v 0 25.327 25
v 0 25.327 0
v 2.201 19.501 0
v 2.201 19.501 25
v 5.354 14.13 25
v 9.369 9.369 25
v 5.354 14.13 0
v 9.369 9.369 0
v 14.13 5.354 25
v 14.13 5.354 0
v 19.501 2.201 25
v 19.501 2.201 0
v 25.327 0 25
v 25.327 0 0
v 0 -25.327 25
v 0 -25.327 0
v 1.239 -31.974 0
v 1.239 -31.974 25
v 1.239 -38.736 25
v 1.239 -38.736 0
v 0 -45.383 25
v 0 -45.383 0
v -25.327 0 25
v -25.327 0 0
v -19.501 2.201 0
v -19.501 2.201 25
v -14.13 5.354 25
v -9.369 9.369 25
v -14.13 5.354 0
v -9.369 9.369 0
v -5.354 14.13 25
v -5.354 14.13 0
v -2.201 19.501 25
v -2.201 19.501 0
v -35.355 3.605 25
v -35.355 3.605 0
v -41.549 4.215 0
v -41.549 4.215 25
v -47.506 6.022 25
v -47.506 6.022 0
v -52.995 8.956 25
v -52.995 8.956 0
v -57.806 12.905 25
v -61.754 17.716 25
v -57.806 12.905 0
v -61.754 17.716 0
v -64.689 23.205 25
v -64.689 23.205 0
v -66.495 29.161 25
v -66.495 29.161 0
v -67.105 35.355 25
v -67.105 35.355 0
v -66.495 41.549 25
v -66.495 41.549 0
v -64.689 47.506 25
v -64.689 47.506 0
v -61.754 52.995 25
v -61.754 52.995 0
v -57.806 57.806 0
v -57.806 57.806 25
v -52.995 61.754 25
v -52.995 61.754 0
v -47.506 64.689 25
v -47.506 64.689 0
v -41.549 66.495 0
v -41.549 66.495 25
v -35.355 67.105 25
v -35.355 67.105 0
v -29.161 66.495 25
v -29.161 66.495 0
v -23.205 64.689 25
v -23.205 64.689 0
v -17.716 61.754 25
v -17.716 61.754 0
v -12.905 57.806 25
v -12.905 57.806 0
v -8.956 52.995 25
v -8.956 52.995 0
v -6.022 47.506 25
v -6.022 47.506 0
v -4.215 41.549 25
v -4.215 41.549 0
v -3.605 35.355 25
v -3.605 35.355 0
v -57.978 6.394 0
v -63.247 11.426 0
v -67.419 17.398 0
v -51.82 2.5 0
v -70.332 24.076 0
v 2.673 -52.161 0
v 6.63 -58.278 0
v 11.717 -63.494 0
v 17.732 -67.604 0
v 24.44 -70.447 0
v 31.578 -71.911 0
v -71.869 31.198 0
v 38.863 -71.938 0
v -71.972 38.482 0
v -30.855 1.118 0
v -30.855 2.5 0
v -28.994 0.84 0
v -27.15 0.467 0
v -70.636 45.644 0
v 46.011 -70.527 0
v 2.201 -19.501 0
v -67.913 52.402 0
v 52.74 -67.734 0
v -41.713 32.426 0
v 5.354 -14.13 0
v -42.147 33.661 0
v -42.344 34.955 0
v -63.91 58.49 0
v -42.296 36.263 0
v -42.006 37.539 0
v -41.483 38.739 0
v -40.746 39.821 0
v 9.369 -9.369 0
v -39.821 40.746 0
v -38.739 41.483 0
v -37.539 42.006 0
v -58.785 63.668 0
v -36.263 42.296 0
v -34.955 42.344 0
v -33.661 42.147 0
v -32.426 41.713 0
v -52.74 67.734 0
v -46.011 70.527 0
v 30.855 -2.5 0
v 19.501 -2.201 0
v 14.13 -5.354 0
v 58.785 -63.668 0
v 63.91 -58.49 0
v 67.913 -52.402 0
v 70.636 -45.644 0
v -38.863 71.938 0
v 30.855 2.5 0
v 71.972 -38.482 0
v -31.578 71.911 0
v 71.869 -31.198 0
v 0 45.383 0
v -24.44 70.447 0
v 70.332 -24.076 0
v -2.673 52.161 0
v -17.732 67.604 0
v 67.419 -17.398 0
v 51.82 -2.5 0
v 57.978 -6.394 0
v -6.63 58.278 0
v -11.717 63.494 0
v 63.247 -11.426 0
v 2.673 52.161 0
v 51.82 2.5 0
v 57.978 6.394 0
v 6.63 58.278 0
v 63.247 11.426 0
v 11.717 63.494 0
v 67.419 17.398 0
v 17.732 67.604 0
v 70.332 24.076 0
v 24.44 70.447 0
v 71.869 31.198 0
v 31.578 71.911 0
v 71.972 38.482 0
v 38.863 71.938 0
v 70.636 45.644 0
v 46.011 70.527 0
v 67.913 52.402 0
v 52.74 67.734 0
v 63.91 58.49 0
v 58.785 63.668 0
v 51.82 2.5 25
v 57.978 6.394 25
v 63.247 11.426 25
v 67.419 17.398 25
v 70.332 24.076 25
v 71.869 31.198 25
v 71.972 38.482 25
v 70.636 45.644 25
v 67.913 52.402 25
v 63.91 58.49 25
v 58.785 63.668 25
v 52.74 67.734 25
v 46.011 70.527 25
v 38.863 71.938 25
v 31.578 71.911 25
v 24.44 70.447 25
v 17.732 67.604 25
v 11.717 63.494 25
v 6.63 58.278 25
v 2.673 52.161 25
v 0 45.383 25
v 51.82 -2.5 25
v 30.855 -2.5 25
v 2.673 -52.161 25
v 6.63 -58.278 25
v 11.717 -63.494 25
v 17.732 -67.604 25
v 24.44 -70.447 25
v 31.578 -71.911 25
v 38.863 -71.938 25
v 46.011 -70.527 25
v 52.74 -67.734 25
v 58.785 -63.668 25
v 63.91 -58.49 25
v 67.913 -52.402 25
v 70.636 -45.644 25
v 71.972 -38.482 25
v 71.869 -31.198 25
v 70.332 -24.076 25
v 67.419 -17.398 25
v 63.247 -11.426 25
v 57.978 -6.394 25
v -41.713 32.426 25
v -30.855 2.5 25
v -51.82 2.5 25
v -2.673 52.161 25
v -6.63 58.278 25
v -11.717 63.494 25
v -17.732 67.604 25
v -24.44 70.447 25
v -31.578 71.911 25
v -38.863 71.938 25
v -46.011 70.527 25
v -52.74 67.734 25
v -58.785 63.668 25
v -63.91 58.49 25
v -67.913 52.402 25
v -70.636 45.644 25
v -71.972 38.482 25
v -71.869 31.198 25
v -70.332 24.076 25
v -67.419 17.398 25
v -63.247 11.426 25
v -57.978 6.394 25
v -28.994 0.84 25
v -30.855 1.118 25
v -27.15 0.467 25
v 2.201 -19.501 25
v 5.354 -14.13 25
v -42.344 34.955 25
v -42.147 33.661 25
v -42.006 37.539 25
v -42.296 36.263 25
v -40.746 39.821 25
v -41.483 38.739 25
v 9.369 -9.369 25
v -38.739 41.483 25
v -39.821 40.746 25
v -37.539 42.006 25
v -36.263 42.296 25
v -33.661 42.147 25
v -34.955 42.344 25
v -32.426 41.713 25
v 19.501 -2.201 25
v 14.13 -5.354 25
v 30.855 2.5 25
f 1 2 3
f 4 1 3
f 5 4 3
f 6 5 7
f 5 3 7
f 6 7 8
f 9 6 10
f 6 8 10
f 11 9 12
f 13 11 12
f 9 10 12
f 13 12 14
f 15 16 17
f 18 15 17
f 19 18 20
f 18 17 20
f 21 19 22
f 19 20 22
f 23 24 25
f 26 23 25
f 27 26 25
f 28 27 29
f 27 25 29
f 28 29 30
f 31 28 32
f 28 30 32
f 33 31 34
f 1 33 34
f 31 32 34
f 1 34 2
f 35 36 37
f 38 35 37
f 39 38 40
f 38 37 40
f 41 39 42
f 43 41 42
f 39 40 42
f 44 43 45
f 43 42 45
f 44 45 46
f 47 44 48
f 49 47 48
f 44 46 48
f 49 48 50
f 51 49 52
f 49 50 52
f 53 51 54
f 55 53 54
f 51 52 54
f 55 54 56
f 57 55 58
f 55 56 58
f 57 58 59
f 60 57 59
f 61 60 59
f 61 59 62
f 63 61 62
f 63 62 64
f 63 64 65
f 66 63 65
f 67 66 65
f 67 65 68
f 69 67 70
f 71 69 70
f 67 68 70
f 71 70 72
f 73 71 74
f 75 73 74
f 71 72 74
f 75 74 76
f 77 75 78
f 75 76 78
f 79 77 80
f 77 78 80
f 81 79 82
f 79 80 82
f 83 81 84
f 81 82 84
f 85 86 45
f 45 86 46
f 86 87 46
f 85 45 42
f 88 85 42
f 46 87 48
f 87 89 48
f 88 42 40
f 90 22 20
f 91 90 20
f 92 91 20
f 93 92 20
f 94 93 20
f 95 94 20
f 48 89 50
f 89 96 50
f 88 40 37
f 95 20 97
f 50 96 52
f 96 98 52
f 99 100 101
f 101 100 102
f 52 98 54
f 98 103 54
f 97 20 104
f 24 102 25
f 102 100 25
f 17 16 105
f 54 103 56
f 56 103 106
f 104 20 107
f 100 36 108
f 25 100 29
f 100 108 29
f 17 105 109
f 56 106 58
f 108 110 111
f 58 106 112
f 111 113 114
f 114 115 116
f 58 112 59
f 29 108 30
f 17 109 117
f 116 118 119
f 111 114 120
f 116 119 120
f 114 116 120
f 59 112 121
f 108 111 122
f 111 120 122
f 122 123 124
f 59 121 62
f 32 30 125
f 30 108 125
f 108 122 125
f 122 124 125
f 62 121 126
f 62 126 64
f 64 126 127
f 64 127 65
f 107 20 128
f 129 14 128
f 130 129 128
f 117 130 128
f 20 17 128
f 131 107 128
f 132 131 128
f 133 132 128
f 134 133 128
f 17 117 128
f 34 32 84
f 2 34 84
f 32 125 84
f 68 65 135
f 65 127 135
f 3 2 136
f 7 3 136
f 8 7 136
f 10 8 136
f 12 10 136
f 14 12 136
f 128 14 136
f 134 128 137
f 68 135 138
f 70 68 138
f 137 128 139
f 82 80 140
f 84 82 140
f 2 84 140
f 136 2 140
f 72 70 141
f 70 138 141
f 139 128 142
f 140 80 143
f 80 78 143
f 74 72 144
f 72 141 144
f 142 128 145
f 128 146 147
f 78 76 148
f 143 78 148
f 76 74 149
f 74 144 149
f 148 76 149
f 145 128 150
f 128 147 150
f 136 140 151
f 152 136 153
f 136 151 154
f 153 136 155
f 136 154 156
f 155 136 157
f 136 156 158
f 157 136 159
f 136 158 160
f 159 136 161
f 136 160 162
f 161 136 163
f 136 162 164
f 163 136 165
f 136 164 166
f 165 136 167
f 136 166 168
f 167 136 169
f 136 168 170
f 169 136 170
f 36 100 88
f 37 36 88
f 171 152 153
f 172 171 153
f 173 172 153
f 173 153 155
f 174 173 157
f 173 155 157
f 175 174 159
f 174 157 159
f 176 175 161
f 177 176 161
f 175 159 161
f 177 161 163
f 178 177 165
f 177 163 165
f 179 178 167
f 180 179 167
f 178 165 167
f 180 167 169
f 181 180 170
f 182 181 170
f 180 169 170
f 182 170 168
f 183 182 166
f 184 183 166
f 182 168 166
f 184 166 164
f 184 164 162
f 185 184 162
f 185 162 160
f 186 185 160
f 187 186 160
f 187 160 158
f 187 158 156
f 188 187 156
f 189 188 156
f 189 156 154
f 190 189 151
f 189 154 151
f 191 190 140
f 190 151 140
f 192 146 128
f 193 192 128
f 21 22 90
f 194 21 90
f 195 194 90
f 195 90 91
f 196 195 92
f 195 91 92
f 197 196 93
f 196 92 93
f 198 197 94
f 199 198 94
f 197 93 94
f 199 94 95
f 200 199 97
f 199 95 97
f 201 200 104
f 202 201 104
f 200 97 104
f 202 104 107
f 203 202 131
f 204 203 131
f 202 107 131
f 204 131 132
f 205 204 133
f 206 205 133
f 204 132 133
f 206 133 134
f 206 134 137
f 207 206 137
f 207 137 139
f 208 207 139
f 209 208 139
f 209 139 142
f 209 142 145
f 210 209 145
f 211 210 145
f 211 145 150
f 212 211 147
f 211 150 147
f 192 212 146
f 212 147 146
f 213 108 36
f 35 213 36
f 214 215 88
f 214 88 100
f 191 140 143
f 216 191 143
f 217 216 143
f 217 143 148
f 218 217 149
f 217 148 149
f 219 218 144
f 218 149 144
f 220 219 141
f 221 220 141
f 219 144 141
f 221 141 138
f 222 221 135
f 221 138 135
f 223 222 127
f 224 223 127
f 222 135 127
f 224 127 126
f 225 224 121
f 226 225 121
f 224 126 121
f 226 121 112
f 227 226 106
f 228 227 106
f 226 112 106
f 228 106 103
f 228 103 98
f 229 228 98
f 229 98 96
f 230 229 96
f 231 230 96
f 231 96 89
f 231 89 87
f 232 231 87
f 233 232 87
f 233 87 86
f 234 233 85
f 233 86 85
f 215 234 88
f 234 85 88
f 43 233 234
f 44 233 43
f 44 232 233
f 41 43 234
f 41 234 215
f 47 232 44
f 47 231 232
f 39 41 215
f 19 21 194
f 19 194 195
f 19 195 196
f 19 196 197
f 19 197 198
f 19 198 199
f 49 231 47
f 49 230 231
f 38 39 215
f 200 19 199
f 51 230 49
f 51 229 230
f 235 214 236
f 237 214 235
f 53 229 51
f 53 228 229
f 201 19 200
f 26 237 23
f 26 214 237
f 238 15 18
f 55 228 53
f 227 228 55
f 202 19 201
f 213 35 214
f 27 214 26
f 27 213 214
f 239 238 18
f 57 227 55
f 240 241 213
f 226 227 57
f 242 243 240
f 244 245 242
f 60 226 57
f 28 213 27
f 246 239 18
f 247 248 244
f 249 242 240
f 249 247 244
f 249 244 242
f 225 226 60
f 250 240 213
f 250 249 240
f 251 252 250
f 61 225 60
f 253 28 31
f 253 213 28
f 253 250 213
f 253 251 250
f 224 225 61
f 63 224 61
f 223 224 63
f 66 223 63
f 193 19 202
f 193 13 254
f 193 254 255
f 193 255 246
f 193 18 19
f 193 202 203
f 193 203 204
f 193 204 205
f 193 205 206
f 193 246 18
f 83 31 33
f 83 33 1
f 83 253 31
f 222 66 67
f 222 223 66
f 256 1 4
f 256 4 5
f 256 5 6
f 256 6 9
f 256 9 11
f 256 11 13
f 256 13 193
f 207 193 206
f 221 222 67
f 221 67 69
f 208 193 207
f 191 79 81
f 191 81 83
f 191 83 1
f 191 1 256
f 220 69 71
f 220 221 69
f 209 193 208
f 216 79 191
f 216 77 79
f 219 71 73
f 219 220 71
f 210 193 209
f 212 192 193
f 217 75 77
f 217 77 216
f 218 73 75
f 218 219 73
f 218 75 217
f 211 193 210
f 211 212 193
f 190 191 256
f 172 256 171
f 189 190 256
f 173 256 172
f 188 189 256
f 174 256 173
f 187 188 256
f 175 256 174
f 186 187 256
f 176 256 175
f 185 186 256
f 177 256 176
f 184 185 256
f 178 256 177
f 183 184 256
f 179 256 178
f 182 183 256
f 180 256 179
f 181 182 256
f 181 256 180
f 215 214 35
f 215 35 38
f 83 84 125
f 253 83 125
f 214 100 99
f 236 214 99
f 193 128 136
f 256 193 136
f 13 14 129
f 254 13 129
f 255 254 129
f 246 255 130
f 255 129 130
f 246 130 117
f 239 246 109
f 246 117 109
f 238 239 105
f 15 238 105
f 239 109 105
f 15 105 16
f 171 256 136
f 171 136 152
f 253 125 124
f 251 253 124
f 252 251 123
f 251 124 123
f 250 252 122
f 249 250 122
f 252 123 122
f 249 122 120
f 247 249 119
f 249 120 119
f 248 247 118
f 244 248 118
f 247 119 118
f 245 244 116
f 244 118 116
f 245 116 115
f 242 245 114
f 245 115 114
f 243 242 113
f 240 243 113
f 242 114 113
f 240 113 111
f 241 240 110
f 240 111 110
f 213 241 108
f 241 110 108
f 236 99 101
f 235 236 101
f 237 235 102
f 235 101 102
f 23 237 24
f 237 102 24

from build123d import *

# Parameters (mm, degrees)
F2_DEPTH = 25


# Not quite as in the source:
# - ends of sketch curves that miss each other by under 0.0002 mm in the source are joined


with BuildPart() as f2:
    # F1 (on face) → F2 (new body)
    with BuildSketch(Plane.XY):
        with BuildLine():
            ThreePointArc((-30.855476, 1.1181271498), (-28.0698825324, 0.6652748768), (-25.3272532308, 0))
            ThreePointArc((-25.3272532308, 0), (-9.3691647914, 9.3691647914), (0, 25.3272532308))
            ThreePointArc((0, 25.3272532308), (9.3691647914, 9.3691647914), (25.3272532308, 0))
            ThreePointArc((25.3272532308, 0), (9.3691647914, -9.3691647914), (0, -25.3272532308))
            ThreePointArc((0, -25.3272532308), (1.394661, -35.355339), (0, -45.3834247692))
            ThreePointArc((0, -45.3834247692), (58.7852402391, -63.6679197359), (51.8201256429, -2.5))
            Line((51.8201256429, -2.5), (30.855475, -2.5))
            Line((30.855475, -2.5), (30.855475, 2.5))
            Line((30.855475, 2.5), (51.8201256429, 2.5))
            ThreePointArc((51.8201256429, 2.5), (58.7852402391, 63.6679197359), (0, 45.3834247692))
            ThreePointArc((0, 45.3834247692), (-58.7852402391, 63.6679197359), (-51.8201256429, 2.5))
            Line((-51.8201256429, 2.5), (-30.855476, 2.5))
            Line((-30.855476, 2.5), (-30.855476, 1.1181271498))
        make_face()
        with BuildLine():
            ThreePointArc((-35.355339, 3.605339), (-57.8059793027, 57.8059793027), (-3.605339, 35.355339))
            Line((-3.605339, 35.355339), (-32.426206, 41.713026))
            ThreePointArc((-32.426206, 41.713026), (-40.3050867894, 40.3050861472), (-41.7130253526, 32.4262052983))
            Line((-41.7130253526, 32.4262052983), (-35.355339, 3.605339))
        make_face(mode=Mode.SUBTRACT)
    extrude(amount=F2_DEPTH)


solid = f2.part
